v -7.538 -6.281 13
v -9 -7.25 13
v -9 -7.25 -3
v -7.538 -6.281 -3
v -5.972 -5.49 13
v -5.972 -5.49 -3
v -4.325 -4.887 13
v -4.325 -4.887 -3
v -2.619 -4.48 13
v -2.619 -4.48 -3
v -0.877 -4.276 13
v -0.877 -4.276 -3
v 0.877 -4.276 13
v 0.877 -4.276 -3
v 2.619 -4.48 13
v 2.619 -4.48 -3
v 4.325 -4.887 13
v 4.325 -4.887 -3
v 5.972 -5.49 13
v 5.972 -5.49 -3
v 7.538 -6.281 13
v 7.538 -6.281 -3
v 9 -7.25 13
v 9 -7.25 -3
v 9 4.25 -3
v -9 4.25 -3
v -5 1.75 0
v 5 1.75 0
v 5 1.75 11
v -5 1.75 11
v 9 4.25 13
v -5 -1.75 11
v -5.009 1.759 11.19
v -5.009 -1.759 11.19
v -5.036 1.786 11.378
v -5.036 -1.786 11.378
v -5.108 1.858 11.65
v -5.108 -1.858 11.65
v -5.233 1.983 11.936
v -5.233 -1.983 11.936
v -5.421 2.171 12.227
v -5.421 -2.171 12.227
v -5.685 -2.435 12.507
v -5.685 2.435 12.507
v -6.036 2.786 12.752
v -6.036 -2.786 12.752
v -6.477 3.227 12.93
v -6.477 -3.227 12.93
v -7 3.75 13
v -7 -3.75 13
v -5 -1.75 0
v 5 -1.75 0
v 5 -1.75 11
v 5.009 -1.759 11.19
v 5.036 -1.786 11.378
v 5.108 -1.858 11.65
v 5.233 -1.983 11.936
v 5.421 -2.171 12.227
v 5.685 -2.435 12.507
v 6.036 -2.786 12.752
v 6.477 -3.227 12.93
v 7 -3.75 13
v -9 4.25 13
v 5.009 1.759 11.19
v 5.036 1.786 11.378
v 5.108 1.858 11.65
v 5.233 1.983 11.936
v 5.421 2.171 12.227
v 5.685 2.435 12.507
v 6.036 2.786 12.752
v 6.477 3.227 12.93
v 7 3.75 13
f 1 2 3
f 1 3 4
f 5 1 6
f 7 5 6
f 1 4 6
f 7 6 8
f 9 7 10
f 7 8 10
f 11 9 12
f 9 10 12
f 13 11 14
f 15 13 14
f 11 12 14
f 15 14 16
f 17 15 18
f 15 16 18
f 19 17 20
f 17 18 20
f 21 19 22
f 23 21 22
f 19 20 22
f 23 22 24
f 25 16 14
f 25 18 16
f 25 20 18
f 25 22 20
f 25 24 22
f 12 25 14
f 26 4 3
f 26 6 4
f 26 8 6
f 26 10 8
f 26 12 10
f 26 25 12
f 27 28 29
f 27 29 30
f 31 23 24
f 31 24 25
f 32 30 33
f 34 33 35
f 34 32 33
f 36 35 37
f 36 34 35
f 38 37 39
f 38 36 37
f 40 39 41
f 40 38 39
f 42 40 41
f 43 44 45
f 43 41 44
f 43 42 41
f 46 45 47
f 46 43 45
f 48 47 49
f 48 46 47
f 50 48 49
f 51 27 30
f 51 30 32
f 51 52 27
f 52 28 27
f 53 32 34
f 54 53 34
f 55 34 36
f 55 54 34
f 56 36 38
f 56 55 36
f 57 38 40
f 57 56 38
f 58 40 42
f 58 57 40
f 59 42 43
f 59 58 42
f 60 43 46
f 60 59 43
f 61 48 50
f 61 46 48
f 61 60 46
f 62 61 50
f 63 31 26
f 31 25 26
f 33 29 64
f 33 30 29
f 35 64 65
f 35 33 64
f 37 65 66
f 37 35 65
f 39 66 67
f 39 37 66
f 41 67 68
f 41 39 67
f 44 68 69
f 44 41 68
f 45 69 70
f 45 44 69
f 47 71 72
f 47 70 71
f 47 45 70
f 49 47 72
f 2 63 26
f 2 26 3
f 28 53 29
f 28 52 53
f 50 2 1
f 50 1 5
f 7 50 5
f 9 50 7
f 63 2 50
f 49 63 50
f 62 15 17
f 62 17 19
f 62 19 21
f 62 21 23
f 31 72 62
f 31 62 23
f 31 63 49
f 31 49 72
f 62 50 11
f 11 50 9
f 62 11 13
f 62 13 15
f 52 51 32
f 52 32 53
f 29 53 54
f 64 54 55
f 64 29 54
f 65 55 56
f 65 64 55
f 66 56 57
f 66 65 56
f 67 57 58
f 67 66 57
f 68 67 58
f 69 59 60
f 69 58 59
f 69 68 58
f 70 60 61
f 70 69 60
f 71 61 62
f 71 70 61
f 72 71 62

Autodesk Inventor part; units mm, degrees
ref_plane "YZ Plane" through (0, 0, 0) normal (1, 0, 0) x (0, 1, 0)
ref_plane "XZ Plane" through (0, 0, 0) normal (0, 1, 0) x (-1, 0, 0)
ref_plane "XY Plane" through (0, 0, 0) normal (0, 0, 1) x (1, 0, 0)
sketch "Skizze1" plane through (0, 0, 0) normal (0, 0, 1) x (1, 0, 0)
  line L0 (-5, -1.75) -> (5, -1.75)
  line L1 (5, -1.75) -> (5, 1.75)
  line L2 (5, 1.75) -> (-5, 1.75)
  line L3 (-5, 1.75) -> (-5, -1.75)
  line L4 (-5, -1.75) -> (5, 1.75) construction
  line L5 (5, -1.75) -> (-5, 1.75) construction
  line L6 (-9, -4.25) -> (9, -4.25)
  line L7 (9, -4.25) -> (9, 4.25)
  line L8 (9, 4.25) -> (-9, 4.25)
  line L9 (-9, 4.25) -> (-9, -4.25)
  line L10 (-9, -4.25) -> (9, 4.25) construction
  line L11 (9, -4.25) -> (-9, 4.25) construction
  line L12 (-9, -4.25) -> (-9, -7.25)
  line L13 (9, -4.25) -> (9, -7.25)
  arc A0 (9, -7.25) -> (-9, -7.25) centre (0, -19.25) ccw
  point P0 (0, 0)
  dimension "d0" = 10
  dimension "d1" = 3.5
  dimension "d2" = 18
  dimension "d3" = 2.5
  dimension "d4" = 3
extrude "Extrusion1" add sketch "Skizze1" along normal blind 13
sketch "Skizze2" plane through (0, 0, 0) normal (0, 0, -1) x (-1, 0, 0)
  line L0 (5, 1.75) -> (5, -1.75) projected
  line L1 (5, -1.75) -> (-5, -1.75) projected
  line L2 (-5, -1.75) -> (-5, 1.75) projected
  line L3 (-5, 1.75) -> (5, 1.75) projected
  line L4 (9, 4.25) -> (9, -7.25) projected
  line L5 (-9, 4.25) -> (9, 4.25) projected
  line L6 (-9, -7.25) -> (-9, 4.25) projected
  arc A0 (9, -7.25) -> (-9, -7.25) centre (0, -19.25) ccw projected
  point P0 (0, 0)
extrude "Extrusion2" add sketch "Skizze2" along normal blind 3 contours L0 L1 L2 L3 | L4 A0 L6 L5
fillet "Rundung1" radius 2 4 edges at (-5, 0, 13) (5, 0, 13) (0, 1.75, 13) (0, -1.75, 13)
properties part number "vibramount"
